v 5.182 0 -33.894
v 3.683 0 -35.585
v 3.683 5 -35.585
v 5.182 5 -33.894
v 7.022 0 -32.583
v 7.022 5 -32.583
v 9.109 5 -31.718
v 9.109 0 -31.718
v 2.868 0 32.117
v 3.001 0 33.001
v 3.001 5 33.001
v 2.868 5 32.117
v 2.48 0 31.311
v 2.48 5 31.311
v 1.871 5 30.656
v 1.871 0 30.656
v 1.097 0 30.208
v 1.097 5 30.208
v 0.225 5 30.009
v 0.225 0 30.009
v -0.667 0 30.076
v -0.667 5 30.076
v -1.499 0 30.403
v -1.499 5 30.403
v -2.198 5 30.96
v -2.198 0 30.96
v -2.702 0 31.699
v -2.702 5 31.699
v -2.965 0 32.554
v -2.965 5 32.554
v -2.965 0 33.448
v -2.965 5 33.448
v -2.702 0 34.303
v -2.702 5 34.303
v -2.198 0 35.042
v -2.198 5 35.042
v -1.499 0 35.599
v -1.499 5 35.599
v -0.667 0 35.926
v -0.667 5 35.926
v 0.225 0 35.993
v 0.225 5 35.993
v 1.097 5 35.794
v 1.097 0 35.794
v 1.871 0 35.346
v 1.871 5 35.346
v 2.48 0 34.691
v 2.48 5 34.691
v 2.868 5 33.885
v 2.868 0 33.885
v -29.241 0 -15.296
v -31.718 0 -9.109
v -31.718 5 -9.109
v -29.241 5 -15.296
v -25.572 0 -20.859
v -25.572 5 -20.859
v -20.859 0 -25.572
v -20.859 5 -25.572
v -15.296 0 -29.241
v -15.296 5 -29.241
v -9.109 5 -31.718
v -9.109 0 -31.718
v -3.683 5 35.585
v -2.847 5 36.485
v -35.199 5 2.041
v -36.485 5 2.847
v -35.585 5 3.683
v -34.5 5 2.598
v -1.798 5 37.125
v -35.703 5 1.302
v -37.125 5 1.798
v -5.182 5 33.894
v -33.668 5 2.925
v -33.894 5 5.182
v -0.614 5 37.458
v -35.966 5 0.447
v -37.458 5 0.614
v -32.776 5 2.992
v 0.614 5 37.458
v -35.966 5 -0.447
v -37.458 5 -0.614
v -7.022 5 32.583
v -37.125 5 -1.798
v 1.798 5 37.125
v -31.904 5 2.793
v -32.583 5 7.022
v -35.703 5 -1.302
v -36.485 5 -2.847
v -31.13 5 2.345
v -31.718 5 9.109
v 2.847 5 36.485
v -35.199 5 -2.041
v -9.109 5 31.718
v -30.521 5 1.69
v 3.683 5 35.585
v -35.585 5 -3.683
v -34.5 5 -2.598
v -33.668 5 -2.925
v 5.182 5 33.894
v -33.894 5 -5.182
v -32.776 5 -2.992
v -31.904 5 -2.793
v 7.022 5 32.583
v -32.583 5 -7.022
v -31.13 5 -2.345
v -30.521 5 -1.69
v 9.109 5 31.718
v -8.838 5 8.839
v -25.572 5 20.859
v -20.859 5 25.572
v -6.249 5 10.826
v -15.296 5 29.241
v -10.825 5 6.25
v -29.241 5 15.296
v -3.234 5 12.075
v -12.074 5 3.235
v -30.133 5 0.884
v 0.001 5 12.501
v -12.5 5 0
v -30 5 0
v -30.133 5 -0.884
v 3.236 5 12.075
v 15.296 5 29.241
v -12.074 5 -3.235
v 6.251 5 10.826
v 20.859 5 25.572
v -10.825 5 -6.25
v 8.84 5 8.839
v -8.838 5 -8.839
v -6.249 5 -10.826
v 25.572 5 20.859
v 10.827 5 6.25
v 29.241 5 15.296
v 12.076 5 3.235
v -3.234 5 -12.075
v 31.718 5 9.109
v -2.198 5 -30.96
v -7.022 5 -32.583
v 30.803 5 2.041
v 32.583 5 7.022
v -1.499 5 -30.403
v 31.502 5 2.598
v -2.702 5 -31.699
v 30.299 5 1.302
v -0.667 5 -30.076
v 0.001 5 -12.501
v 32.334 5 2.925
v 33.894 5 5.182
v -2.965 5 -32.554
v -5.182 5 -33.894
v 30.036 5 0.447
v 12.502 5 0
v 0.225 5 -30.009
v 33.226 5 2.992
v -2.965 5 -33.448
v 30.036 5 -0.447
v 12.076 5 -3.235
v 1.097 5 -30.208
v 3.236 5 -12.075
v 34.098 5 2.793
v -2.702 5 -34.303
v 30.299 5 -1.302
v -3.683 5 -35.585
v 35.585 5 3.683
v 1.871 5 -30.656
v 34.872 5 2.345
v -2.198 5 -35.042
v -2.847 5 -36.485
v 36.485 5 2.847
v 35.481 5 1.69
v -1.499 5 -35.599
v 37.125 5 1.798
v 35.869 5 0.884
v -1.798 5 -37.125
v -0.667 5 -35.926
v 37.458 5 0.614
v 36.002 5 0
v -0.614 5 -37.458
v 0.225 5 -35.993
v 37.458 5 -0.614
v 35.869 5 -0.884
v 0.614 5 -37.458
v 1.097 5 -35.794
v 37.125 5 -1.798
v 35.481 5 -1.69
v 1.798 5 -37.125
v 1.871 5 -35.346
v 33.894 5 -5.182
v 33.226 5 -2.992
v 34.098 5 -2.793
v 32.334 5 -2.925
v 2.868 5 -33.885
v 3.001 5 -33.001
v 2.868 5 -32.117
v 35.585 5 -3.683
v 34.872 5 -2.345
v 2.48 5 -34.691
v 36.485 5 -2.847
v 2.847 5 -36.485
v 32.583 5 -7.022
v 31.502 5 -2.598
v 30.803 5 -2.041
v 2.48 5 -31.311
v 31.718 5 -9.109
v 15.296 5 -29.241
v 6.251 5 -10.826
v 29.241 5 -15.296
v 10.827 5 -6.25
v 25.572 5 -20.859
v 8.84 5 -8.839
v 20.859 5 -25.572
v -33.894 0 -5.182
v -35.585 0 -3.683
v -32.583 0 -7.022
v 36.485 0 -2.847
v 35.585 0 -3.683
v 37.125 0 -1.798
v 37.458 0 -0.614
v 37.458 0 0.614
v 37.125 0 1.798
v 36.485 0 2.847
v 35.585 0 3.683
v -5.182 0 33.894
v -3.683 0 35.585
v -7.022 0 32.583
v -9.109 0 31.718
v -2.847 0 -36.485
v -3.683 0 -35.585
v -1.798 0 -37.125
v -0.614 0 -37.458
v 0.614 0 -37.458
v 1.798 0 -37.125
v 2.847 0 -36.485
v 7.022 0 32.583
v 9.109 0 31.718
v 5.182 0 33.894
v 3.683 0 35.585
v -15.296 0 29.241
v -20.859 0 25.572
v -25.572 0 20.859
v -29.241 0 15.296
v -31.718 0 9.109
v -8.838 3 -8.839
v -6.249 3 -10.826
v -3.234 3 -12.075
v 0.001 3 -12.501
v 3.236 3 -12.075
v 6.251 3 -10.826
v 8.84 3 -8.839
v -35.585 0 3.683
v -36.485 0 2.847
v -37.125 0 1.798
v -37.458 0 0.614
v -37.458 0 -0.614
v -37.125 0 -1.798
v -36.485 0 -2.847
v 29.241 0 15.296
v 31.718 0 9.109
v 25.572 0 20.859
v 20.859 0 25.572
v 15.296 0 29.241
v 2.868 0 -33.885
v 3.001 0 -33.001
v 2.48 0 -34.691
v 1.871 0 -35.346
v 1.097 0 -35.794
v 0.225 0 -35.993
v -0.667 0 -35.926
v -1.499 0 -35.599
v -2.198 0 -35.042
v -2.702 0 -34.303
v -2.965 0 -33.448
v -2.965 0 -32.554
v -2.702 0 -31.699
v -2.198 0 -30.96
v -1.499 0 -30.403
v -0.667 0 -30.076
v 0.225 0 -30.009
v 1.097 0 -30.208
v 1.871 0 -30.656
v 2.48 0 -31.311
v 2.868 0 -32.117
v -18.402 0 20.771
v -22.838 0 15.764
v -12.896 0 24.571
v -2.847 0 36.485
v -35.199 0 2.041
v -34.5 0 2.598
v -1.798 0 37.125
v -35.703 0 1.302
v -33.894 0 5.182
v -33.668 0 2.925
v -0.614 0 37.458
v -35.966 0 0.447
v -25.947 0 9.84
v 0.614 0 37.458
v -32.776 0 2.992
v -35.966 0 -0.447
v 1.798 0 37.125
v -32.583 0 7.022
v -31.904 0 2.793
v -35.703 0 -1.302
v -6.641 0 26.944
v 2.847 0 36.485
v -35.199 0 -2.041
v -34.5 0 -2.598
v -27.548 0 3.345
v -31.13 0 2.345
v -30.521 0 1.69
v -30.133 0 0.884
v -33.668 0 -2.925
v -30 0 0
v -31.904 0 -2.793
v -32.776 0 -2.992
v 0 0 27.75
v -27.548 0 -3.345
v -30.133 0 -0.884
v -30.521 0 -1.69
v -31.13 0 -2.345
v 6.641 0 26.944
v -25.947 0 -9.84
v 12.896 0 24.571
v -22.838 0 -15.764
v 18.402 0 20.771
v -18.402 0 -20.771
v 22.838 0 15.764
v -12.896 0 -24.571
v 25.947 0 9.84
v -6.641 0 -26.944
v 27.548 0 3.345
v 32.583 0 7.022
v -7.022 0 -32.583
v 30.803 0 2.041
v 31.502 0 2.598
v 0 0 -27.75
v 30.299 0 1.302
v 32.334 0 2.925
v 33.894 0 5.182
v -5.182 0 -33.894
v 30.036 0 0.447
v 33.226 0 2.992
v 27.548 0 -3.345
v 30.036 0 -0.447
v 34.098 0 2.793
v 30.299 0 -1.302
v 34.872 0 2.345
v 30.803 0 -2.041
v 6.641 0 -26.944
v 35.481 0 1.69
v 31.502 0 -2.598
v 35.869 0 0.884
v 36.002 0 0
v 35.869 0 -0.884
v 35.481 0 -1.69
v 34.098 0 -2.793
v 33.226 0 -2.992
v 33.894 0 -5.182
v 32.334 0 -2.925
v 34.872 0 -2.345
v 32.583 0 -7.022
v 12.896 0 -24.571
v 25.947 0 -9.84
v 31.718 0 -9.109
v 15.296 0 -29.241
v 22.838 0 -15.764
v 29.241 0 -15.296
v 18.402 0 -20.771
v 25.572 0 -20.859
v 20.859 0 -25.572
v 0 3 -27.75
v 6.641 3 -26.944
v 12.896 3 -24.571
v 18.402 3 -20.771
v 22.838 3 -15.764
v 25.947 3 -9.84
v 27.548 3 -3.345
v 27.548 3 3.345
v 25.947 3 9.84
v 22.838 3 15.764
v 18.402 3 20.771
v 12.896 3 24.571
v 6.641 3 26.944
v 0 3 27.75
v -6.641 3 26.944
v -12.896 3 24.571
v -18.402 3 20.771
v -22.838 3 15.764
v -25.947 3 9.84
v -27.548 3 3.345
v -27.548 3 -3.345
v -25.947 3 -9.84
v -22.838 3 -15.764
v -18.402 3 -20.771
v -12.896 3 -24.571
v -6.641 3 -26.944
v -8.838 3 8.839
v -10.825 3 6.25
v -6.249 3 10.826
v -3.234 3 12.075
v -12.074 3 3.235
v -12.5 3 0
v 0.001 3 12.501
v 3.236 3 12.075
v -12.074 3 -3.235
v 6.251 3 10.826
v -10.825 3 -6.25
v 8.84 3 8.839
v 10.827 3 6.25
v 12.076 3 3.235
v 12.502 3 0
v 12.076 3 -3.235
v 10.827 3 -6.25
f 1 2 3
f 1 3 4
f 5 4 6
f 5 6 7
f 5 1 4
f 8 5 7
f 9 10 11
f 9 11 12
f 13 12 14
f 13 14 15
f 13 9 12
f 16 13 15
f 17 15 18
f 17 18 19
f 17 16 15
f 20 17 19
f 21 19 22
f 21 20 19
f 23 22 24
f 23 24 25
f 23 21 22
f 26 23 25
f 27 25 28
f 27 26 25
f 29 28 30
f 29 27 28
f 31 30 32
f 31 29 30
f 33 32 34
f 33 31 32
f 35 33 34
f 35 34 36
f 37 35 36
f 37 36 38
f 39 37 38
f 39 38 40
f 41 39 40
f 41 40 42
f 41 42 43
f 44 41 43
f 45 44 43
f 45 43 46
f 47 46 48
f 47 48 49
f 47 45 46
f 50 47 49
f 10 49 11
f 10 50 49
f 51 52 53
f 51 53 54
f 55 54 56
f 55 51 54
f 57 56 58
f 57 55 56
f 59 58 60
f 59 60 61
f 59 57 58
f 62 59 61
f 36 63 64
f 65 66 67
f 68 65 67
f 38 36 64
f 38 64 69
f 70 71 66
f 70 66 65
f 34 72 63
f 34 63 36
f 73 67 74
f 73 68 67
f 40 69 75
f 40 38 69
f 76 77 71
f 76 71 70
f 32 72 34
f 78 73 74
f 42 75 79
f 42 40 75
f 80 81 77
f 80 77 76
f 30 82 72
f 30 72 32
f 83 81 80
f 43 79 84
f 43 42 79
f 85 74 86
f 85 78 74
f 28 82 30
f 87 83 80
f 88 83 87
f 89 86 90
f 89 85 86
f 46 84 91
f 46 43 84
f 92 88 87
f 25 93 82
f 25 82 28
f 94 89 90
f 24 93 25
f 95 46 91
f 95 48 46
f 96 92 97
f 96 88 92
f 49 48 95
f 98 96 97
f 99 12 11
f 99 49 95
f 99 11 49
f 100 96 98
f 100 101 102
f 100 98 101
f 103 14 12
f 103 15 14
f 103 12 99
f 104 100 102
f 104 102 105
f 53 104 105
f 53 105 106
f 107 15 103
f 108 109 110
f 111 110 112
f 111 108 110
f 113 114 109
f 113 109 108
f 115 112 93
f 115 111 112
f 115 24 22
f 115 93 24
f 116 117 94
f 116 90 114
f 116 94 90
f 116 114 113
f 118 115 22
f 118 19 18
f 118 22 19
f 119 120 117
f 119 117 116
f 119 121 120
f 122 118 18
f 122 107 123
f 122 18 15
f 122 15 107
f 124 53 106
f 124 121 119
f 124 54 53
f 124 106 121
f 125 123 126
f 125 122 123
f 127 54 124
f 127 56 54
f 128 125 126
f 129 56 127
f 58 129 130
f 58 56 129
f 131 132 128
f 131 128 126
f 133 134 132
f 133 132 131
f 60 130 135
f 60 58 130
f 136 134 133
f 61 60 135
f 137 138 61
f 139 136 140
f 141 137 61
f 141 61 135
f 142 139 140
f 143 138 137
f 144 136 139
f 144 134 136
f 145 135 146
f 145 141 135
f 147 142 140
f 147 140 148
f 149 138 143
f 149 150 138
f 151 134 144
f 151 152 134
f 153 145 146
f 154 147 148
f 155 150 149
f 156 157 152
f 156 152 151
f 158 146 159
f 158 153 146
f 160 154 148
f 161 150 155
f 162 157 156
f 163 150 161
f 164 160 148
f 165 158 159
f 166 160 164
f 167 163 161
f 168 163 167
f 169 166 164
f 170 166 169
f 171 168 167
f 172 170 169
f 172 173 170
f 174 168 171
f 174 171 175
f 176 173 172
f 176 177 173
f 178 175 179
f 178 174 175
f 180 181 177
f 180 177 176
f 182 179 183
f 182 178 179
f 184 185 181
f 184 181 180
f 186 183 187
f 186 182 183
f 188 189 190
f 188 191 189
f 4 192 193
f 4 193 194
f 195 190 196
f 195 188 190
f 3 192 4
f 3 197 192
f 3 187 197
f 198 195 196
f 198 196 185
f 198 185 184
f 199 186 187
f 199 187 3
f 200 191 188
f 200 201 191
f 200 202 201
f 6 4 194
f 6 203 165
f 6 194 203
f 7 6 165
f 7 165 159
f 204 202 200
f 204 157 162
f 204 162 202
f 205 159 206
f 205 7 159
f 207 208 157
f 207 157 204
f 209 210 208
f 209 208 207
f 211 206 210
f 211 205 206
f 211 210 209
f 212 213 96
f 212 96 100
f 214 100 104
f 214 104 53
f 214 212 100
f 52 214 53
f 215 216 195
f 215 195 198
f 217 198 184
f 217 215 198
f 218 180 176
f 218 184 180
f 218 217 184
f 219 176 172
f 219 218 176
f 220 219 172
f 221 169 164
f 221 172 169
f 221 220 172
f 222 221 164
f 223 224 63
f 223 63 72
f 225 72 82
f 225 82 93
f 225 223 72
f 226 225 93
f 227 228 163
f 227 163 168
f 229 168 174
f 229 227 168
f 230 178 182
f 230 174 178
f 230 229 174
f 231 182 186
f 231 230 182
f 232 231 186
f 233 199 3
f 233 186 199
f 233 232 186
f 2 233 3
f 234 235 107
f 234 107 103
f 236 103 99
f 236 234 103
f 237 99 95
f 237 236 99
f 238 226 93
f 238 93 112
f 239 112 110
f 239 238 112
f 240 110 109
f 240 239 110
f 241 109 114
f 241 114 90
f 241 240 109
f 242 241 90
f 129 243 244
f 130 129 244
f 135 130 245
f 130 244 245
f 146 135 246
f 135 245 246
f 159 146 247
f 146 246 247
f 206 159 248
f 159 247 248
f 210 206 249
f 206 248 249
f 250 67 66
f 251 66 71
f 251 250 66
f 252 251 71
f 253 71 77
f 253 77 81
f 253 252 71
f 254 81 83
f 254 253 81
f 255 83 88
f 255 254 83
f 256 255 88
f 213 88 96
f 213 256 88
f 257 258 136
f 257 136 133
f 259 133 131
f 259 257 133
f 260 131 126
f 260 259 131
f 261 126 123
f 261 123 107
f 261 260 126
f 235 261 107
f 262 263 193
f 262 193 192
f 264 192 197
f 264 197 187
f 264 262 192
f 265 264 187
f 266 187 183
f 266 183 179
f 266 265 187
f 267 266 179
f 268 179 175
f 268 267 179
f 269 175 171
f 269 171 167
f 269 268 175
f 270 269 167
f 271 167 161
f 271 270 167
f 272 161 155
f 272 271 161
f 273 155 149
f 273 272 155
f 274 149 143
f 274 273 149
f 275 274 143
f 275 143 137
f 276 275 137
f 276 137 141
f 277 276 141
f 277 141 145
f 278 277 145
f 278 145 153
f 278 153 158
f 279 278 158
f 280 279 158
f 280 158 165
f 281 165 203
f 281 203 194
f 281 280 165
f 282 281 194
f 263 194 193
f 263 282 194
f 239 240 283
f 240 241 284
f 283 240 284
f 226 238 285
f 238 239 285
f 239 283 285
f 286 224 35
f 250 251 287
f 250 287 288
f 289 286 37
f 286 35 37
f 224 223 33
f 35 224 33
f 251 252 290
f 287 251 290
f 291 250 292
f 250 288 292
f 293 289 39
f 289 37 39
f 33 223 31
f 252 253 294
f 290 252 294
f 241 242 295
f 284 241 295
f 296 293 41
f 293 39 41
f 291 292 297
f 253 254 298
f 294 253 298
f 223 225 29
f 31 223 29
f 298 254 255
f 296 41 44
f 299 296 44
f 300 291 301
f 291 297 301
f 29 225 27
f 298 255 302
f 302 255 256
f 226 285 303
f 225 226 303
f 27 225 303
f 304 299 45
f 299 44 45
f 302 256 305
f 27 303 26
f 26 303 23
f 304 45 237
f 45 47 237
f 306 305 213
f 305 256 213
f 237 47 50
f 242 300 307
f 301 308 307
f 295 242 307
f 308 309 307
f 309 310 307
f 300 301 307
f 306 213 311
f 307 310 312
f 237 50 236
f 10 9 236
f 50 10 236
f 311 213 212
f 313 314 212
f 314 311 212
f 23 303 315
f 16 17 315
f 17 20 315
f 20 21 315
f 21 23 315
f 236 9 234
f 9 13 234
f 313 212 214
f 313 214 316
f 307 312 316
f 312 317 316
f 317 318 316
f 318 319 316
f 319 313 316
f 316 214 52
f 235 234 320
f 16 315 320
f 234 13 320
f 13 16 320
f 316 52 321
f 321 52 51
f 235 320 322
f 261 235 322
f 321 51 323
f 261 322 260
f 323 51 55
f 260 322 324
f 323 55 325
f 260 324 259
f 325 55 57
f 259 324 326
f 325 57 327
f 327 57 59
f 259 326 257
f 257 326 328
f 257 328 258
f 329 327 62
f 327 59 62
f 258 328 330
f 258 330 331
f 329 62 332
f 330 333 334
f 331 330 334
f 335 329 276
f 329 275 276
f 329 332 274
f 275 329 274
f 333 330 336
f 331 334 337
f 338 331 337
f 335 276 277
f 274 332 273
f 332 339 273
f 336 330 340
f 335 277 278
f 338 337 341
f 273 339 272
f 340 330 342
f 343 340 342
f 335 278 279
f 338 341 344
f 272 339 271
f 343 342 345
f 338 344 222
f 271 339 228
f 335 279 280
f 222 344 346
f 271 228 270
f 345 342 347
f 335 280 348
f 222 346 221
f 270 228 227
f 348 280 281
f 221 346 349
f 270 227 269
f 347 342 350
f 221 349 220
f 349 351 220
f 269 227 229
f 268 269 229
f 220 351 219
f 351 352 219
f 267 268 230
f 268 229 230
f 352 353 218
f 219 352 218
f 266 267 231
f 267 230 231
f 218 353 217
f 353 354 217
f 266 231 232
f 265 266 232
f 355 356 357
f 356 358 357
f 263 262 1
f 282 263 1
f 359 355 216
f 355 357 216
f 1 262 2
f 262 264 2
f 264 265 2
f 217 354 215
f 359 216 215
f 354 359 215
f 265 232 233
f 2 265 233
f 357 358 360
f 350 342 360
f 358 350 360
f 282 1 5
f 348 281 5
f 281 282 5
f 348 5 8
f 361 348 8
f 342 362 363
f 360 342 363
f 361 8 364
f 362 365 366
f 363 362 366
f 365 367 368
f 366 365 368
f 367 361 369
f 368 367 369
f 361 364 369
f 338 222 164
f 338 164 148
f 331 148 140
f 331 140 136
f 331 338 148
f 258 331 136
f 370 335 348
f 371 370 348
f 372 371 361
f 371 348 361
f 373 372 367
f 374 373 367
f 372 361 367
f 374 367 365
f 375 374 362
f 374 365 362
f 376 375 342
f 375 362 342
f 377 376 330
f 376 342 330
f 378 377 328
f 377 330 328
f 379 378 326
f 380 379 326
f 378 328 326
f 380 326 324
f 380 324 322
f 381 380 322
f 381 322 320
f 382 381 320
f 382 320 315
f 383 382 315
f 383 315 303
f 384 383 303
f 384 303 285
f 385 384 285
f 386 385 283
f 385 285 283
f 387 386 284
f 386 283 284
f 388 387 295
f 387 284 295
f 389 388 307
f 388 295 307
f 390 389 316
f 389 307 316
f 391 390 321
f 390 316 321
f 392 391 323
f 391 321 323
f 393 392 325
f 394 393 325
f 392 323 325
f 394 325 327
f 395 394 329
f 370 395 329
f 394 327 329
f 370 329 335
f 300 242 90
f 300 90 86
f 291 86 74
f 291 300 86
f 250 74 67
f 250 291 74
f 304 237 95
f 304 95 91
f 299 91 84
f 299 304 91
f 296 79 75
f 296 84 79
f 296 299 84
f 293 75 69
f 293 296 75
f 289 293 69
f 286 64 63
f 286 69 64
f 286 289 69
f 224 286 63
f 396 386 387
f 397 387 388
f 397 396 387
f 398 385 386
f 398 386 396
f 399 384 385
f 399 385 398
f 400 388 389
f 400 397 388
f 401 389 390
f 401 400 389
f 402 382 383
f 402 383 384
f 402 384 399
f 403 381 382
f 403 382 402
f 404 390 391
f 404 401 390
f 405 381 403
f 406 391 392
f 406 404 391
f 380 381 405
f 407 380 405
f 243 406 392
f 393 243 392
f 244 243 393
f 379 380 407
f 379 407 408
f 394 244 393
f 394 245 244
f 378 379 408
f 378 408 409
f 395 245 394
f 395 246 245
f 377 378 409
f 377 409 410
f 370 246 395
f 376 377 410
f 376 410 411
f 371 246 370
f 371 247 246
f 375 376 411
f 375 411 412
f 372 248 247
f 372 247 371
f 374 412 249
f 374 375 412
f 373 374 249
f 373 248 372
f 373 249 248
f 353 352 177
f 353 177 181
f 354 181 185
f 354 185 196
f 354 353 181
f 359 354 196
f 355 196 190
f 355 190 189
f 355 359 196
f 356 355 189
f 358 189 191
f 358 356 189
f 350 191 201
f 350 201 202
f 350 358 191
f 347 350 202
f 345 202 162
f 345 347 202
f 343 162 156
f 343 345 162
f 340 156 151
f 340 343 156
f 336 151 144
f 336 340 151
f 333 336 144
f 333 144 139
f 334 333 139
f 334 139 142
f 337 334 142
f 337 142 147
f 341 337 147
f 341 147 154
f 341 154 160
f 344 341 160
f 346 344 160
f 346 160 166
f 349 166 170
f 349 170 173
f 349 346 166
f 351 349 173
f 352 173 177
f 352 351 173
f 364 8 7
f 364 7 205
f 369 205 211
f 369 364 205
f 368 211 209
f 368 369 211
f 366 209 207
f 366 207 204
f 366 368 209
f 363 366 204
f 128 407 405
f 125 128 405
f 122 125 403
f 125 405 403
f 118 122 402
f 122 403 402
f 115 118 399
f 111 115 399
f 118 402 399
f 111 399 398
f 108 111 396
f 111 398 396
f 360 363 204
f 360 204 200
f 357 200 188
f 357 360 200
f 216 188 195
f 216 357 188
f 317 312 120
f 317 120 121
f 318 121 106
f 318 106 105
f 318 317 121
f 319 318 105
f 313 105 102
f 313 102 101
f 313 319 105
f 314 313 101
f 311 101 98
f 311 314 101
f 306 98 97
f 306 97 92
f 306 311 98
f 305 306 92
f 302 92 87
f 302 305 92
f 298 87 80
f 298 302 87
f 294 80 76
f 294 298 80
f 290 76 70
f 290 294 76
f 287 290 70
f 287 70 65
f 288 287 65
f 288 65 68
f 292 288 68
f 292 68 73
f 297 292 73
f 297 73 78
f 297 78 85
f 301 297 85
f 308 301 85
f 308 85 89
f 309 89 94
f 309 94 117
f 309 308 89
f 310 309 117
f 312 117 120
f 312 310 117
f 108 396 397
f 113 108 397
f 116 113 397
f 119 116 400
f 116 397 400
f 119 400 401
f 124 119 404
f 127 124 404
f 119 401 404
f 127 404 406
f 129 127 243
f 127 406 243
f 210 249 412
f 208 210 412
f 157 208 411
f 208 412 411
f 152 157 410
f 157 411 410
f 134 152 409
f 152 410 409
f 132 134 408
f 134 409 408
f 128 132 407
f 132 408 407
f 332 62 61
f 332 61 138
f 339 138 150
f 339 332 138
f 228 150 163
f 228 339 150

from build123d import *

# Parameters (mm, degrees)
BOSS_EXTRUDE1_OUTLINE_W = 75
BOSS_EXTRUDE1_OUTLINE_H = 75
BOSS_EXTRUDE1_OUTLINE_R = 3
BOSS_EXTRUDE1_DEPTH     = 5
SKETCH2_R               = 27.75
CUT_EXTRUDE1_DEPTH      = 3
SKETCH3_OUTSIDE_W       = 98.236
SKETCH3_OUTSIDE_H       = 98.236
CUT_EXTRUDE5_DEPTH      = 5


# Read off the part's stored shape, not the designer's step: Boss-Extrude1
with BuildPart() as part:
    # Boss-Extrude1 outline → Boss-Extrude1 (new body)
    with BuildSketch(Plane(origin=(0, 0, 0), x_dir=(1, 0, 0), z_dir=(0, 1, 0))):
        Rectangle(BOSS_EXTRUDE1_OUTLINE_W, BOSS_EXTRUDE1_OUTLINE_H)
        with Locations((0.001, -33.001)):
            Circle(BOSS_EXTRUDE1_OUTLINE_R, mode=Mode.SUBTRACT)
        with Locations((-33, 0)):
            Circle(BOSS_EXTRUDE1_OUTLINE_R, mode=Mode.SUBTRACT)
        with BuildLine():
            ThreePointArc((8.840334751, 8.839334751), (12.502, 0), (8.840334751, -8.839334751))
            ThreePointArc((8.840334751, -8.839334751), (0.001, -12.501), (-8.838334751, -8.839334751))
            ThreePointArc((-8.838334751, -8.839334751), (-12.5, 0), (-8.838334751, 8.839334751))
            ThreePointArc((-8.838334751, 8.839334751), (0.001, 12.501), (8.840334751, 8.839334751))
        make_face(mode=Mode.SUBTRACT)
        with Locations((33.002, 0)):
            Circle(BOSS_EXTRUDE1_OUTLINE_R, mode=Mode.SUBTRACT)
        with Locations((0.001, 33.001)):
            Circle(BOSS_EXTRUDE1_OUTLINE_R, mode=Mode.SUBTRACT)
    extrude(amount=BOSS_EXTRUDE1_DEPTH)

    # Sketch2 → Cut-Extrude1 (cut)
    with BuildSketch(Plane.XZ):
        with Locations(Location((0, 0, 0), (0, 0, 270))):
            Circle(SKETCH2_R)
    extrude(amount=-CUT_EXTRUDE1_DEPTH, mode=Mode.SUBTRACT)

    # Sketch3 outside → Cut-Extrude5 (cut)
    with BuildSketch(Plane.XZ):
        Rectangle(SKETCH3_OUTSIDE_W, SKETCH3_OUTSIDE_H)
        with BuildLine():
            ThreePointArc((-31.718023256, -9.10862233), (-23.334523779, -23.334523779), (-9.10862233, -31.718023256))
            ThreePointArc((-9.10862233, -31.718023256), (-6.064515675, -33.186440594), (-3.683424077, -35.585031348))
            ThreePointArc((-3.683424077, -35.585031348), (0, -37.5), (3.683424077, -35.585031348))
            ThreePointArc((3.683424077, -35.585031348), (6.064515675, -33.186440594), (9.10862233, -31.718023256))
            ThreePointArc((9.10862233, -31.718023256), (23.334523779, -23.334523779), (31.718023256, -9.10862233))
            ThreePointArc((31.718023256, -9.10862233), (33.186440594, -6.064515675), (35.585031348, -3.683424077))
            ThreePointArc((35.585031348, -3.683424077), (37.5, 0), (35.585031348, 3.683424077))
            ThreePointArc((35.585031348, 3.683424077), (33.186440594, 6.064515675), (31.718023256, 9.10862233))
            ThreePointArc((31.718023256, 9.10862233), (23.334523779, 23.334523779), (9.10862233, 31.718023256))
            ThreePointArc((9.10862233, 31.718023256), (6.064515675, 33.186440594), (3.683424077, 35.585031348))
            ThreePointArc((3.683424077, 35.585031348), (0, 37.5), (-3.683424077, 35.585031348))
            ThreePointArc((-3.683424077, 35.585031348), (-6.064515675, 33.186440594), (-9.10862233, 31.718023256))
            ThreePointArc((-9.10862233, 31.718023256), (-23.334523779, 23.334523779), (-31.718023256, 9.10862233))
            ThreePointArc((-31.718023256, 9.10862233), (-33.186440594, 6.064515675), (-35.585031348, 3.683424077))
            ThreePointArc((-35.585031348, 3.683424077), (-37.5, 0), (-35.585031348, -3.683424077))
            ThreePointArc((-35.585031348, -3.683424077), (-33.186440594, -6.064515675), (-31.718023256, -9.10862233))
        make_face(mode=Mode.SUBTRACT)
    extrude(amount=-CUT_EXTRUDE5_DEPTH, mode=Mode.SUBTRACT)


solid = part.part
